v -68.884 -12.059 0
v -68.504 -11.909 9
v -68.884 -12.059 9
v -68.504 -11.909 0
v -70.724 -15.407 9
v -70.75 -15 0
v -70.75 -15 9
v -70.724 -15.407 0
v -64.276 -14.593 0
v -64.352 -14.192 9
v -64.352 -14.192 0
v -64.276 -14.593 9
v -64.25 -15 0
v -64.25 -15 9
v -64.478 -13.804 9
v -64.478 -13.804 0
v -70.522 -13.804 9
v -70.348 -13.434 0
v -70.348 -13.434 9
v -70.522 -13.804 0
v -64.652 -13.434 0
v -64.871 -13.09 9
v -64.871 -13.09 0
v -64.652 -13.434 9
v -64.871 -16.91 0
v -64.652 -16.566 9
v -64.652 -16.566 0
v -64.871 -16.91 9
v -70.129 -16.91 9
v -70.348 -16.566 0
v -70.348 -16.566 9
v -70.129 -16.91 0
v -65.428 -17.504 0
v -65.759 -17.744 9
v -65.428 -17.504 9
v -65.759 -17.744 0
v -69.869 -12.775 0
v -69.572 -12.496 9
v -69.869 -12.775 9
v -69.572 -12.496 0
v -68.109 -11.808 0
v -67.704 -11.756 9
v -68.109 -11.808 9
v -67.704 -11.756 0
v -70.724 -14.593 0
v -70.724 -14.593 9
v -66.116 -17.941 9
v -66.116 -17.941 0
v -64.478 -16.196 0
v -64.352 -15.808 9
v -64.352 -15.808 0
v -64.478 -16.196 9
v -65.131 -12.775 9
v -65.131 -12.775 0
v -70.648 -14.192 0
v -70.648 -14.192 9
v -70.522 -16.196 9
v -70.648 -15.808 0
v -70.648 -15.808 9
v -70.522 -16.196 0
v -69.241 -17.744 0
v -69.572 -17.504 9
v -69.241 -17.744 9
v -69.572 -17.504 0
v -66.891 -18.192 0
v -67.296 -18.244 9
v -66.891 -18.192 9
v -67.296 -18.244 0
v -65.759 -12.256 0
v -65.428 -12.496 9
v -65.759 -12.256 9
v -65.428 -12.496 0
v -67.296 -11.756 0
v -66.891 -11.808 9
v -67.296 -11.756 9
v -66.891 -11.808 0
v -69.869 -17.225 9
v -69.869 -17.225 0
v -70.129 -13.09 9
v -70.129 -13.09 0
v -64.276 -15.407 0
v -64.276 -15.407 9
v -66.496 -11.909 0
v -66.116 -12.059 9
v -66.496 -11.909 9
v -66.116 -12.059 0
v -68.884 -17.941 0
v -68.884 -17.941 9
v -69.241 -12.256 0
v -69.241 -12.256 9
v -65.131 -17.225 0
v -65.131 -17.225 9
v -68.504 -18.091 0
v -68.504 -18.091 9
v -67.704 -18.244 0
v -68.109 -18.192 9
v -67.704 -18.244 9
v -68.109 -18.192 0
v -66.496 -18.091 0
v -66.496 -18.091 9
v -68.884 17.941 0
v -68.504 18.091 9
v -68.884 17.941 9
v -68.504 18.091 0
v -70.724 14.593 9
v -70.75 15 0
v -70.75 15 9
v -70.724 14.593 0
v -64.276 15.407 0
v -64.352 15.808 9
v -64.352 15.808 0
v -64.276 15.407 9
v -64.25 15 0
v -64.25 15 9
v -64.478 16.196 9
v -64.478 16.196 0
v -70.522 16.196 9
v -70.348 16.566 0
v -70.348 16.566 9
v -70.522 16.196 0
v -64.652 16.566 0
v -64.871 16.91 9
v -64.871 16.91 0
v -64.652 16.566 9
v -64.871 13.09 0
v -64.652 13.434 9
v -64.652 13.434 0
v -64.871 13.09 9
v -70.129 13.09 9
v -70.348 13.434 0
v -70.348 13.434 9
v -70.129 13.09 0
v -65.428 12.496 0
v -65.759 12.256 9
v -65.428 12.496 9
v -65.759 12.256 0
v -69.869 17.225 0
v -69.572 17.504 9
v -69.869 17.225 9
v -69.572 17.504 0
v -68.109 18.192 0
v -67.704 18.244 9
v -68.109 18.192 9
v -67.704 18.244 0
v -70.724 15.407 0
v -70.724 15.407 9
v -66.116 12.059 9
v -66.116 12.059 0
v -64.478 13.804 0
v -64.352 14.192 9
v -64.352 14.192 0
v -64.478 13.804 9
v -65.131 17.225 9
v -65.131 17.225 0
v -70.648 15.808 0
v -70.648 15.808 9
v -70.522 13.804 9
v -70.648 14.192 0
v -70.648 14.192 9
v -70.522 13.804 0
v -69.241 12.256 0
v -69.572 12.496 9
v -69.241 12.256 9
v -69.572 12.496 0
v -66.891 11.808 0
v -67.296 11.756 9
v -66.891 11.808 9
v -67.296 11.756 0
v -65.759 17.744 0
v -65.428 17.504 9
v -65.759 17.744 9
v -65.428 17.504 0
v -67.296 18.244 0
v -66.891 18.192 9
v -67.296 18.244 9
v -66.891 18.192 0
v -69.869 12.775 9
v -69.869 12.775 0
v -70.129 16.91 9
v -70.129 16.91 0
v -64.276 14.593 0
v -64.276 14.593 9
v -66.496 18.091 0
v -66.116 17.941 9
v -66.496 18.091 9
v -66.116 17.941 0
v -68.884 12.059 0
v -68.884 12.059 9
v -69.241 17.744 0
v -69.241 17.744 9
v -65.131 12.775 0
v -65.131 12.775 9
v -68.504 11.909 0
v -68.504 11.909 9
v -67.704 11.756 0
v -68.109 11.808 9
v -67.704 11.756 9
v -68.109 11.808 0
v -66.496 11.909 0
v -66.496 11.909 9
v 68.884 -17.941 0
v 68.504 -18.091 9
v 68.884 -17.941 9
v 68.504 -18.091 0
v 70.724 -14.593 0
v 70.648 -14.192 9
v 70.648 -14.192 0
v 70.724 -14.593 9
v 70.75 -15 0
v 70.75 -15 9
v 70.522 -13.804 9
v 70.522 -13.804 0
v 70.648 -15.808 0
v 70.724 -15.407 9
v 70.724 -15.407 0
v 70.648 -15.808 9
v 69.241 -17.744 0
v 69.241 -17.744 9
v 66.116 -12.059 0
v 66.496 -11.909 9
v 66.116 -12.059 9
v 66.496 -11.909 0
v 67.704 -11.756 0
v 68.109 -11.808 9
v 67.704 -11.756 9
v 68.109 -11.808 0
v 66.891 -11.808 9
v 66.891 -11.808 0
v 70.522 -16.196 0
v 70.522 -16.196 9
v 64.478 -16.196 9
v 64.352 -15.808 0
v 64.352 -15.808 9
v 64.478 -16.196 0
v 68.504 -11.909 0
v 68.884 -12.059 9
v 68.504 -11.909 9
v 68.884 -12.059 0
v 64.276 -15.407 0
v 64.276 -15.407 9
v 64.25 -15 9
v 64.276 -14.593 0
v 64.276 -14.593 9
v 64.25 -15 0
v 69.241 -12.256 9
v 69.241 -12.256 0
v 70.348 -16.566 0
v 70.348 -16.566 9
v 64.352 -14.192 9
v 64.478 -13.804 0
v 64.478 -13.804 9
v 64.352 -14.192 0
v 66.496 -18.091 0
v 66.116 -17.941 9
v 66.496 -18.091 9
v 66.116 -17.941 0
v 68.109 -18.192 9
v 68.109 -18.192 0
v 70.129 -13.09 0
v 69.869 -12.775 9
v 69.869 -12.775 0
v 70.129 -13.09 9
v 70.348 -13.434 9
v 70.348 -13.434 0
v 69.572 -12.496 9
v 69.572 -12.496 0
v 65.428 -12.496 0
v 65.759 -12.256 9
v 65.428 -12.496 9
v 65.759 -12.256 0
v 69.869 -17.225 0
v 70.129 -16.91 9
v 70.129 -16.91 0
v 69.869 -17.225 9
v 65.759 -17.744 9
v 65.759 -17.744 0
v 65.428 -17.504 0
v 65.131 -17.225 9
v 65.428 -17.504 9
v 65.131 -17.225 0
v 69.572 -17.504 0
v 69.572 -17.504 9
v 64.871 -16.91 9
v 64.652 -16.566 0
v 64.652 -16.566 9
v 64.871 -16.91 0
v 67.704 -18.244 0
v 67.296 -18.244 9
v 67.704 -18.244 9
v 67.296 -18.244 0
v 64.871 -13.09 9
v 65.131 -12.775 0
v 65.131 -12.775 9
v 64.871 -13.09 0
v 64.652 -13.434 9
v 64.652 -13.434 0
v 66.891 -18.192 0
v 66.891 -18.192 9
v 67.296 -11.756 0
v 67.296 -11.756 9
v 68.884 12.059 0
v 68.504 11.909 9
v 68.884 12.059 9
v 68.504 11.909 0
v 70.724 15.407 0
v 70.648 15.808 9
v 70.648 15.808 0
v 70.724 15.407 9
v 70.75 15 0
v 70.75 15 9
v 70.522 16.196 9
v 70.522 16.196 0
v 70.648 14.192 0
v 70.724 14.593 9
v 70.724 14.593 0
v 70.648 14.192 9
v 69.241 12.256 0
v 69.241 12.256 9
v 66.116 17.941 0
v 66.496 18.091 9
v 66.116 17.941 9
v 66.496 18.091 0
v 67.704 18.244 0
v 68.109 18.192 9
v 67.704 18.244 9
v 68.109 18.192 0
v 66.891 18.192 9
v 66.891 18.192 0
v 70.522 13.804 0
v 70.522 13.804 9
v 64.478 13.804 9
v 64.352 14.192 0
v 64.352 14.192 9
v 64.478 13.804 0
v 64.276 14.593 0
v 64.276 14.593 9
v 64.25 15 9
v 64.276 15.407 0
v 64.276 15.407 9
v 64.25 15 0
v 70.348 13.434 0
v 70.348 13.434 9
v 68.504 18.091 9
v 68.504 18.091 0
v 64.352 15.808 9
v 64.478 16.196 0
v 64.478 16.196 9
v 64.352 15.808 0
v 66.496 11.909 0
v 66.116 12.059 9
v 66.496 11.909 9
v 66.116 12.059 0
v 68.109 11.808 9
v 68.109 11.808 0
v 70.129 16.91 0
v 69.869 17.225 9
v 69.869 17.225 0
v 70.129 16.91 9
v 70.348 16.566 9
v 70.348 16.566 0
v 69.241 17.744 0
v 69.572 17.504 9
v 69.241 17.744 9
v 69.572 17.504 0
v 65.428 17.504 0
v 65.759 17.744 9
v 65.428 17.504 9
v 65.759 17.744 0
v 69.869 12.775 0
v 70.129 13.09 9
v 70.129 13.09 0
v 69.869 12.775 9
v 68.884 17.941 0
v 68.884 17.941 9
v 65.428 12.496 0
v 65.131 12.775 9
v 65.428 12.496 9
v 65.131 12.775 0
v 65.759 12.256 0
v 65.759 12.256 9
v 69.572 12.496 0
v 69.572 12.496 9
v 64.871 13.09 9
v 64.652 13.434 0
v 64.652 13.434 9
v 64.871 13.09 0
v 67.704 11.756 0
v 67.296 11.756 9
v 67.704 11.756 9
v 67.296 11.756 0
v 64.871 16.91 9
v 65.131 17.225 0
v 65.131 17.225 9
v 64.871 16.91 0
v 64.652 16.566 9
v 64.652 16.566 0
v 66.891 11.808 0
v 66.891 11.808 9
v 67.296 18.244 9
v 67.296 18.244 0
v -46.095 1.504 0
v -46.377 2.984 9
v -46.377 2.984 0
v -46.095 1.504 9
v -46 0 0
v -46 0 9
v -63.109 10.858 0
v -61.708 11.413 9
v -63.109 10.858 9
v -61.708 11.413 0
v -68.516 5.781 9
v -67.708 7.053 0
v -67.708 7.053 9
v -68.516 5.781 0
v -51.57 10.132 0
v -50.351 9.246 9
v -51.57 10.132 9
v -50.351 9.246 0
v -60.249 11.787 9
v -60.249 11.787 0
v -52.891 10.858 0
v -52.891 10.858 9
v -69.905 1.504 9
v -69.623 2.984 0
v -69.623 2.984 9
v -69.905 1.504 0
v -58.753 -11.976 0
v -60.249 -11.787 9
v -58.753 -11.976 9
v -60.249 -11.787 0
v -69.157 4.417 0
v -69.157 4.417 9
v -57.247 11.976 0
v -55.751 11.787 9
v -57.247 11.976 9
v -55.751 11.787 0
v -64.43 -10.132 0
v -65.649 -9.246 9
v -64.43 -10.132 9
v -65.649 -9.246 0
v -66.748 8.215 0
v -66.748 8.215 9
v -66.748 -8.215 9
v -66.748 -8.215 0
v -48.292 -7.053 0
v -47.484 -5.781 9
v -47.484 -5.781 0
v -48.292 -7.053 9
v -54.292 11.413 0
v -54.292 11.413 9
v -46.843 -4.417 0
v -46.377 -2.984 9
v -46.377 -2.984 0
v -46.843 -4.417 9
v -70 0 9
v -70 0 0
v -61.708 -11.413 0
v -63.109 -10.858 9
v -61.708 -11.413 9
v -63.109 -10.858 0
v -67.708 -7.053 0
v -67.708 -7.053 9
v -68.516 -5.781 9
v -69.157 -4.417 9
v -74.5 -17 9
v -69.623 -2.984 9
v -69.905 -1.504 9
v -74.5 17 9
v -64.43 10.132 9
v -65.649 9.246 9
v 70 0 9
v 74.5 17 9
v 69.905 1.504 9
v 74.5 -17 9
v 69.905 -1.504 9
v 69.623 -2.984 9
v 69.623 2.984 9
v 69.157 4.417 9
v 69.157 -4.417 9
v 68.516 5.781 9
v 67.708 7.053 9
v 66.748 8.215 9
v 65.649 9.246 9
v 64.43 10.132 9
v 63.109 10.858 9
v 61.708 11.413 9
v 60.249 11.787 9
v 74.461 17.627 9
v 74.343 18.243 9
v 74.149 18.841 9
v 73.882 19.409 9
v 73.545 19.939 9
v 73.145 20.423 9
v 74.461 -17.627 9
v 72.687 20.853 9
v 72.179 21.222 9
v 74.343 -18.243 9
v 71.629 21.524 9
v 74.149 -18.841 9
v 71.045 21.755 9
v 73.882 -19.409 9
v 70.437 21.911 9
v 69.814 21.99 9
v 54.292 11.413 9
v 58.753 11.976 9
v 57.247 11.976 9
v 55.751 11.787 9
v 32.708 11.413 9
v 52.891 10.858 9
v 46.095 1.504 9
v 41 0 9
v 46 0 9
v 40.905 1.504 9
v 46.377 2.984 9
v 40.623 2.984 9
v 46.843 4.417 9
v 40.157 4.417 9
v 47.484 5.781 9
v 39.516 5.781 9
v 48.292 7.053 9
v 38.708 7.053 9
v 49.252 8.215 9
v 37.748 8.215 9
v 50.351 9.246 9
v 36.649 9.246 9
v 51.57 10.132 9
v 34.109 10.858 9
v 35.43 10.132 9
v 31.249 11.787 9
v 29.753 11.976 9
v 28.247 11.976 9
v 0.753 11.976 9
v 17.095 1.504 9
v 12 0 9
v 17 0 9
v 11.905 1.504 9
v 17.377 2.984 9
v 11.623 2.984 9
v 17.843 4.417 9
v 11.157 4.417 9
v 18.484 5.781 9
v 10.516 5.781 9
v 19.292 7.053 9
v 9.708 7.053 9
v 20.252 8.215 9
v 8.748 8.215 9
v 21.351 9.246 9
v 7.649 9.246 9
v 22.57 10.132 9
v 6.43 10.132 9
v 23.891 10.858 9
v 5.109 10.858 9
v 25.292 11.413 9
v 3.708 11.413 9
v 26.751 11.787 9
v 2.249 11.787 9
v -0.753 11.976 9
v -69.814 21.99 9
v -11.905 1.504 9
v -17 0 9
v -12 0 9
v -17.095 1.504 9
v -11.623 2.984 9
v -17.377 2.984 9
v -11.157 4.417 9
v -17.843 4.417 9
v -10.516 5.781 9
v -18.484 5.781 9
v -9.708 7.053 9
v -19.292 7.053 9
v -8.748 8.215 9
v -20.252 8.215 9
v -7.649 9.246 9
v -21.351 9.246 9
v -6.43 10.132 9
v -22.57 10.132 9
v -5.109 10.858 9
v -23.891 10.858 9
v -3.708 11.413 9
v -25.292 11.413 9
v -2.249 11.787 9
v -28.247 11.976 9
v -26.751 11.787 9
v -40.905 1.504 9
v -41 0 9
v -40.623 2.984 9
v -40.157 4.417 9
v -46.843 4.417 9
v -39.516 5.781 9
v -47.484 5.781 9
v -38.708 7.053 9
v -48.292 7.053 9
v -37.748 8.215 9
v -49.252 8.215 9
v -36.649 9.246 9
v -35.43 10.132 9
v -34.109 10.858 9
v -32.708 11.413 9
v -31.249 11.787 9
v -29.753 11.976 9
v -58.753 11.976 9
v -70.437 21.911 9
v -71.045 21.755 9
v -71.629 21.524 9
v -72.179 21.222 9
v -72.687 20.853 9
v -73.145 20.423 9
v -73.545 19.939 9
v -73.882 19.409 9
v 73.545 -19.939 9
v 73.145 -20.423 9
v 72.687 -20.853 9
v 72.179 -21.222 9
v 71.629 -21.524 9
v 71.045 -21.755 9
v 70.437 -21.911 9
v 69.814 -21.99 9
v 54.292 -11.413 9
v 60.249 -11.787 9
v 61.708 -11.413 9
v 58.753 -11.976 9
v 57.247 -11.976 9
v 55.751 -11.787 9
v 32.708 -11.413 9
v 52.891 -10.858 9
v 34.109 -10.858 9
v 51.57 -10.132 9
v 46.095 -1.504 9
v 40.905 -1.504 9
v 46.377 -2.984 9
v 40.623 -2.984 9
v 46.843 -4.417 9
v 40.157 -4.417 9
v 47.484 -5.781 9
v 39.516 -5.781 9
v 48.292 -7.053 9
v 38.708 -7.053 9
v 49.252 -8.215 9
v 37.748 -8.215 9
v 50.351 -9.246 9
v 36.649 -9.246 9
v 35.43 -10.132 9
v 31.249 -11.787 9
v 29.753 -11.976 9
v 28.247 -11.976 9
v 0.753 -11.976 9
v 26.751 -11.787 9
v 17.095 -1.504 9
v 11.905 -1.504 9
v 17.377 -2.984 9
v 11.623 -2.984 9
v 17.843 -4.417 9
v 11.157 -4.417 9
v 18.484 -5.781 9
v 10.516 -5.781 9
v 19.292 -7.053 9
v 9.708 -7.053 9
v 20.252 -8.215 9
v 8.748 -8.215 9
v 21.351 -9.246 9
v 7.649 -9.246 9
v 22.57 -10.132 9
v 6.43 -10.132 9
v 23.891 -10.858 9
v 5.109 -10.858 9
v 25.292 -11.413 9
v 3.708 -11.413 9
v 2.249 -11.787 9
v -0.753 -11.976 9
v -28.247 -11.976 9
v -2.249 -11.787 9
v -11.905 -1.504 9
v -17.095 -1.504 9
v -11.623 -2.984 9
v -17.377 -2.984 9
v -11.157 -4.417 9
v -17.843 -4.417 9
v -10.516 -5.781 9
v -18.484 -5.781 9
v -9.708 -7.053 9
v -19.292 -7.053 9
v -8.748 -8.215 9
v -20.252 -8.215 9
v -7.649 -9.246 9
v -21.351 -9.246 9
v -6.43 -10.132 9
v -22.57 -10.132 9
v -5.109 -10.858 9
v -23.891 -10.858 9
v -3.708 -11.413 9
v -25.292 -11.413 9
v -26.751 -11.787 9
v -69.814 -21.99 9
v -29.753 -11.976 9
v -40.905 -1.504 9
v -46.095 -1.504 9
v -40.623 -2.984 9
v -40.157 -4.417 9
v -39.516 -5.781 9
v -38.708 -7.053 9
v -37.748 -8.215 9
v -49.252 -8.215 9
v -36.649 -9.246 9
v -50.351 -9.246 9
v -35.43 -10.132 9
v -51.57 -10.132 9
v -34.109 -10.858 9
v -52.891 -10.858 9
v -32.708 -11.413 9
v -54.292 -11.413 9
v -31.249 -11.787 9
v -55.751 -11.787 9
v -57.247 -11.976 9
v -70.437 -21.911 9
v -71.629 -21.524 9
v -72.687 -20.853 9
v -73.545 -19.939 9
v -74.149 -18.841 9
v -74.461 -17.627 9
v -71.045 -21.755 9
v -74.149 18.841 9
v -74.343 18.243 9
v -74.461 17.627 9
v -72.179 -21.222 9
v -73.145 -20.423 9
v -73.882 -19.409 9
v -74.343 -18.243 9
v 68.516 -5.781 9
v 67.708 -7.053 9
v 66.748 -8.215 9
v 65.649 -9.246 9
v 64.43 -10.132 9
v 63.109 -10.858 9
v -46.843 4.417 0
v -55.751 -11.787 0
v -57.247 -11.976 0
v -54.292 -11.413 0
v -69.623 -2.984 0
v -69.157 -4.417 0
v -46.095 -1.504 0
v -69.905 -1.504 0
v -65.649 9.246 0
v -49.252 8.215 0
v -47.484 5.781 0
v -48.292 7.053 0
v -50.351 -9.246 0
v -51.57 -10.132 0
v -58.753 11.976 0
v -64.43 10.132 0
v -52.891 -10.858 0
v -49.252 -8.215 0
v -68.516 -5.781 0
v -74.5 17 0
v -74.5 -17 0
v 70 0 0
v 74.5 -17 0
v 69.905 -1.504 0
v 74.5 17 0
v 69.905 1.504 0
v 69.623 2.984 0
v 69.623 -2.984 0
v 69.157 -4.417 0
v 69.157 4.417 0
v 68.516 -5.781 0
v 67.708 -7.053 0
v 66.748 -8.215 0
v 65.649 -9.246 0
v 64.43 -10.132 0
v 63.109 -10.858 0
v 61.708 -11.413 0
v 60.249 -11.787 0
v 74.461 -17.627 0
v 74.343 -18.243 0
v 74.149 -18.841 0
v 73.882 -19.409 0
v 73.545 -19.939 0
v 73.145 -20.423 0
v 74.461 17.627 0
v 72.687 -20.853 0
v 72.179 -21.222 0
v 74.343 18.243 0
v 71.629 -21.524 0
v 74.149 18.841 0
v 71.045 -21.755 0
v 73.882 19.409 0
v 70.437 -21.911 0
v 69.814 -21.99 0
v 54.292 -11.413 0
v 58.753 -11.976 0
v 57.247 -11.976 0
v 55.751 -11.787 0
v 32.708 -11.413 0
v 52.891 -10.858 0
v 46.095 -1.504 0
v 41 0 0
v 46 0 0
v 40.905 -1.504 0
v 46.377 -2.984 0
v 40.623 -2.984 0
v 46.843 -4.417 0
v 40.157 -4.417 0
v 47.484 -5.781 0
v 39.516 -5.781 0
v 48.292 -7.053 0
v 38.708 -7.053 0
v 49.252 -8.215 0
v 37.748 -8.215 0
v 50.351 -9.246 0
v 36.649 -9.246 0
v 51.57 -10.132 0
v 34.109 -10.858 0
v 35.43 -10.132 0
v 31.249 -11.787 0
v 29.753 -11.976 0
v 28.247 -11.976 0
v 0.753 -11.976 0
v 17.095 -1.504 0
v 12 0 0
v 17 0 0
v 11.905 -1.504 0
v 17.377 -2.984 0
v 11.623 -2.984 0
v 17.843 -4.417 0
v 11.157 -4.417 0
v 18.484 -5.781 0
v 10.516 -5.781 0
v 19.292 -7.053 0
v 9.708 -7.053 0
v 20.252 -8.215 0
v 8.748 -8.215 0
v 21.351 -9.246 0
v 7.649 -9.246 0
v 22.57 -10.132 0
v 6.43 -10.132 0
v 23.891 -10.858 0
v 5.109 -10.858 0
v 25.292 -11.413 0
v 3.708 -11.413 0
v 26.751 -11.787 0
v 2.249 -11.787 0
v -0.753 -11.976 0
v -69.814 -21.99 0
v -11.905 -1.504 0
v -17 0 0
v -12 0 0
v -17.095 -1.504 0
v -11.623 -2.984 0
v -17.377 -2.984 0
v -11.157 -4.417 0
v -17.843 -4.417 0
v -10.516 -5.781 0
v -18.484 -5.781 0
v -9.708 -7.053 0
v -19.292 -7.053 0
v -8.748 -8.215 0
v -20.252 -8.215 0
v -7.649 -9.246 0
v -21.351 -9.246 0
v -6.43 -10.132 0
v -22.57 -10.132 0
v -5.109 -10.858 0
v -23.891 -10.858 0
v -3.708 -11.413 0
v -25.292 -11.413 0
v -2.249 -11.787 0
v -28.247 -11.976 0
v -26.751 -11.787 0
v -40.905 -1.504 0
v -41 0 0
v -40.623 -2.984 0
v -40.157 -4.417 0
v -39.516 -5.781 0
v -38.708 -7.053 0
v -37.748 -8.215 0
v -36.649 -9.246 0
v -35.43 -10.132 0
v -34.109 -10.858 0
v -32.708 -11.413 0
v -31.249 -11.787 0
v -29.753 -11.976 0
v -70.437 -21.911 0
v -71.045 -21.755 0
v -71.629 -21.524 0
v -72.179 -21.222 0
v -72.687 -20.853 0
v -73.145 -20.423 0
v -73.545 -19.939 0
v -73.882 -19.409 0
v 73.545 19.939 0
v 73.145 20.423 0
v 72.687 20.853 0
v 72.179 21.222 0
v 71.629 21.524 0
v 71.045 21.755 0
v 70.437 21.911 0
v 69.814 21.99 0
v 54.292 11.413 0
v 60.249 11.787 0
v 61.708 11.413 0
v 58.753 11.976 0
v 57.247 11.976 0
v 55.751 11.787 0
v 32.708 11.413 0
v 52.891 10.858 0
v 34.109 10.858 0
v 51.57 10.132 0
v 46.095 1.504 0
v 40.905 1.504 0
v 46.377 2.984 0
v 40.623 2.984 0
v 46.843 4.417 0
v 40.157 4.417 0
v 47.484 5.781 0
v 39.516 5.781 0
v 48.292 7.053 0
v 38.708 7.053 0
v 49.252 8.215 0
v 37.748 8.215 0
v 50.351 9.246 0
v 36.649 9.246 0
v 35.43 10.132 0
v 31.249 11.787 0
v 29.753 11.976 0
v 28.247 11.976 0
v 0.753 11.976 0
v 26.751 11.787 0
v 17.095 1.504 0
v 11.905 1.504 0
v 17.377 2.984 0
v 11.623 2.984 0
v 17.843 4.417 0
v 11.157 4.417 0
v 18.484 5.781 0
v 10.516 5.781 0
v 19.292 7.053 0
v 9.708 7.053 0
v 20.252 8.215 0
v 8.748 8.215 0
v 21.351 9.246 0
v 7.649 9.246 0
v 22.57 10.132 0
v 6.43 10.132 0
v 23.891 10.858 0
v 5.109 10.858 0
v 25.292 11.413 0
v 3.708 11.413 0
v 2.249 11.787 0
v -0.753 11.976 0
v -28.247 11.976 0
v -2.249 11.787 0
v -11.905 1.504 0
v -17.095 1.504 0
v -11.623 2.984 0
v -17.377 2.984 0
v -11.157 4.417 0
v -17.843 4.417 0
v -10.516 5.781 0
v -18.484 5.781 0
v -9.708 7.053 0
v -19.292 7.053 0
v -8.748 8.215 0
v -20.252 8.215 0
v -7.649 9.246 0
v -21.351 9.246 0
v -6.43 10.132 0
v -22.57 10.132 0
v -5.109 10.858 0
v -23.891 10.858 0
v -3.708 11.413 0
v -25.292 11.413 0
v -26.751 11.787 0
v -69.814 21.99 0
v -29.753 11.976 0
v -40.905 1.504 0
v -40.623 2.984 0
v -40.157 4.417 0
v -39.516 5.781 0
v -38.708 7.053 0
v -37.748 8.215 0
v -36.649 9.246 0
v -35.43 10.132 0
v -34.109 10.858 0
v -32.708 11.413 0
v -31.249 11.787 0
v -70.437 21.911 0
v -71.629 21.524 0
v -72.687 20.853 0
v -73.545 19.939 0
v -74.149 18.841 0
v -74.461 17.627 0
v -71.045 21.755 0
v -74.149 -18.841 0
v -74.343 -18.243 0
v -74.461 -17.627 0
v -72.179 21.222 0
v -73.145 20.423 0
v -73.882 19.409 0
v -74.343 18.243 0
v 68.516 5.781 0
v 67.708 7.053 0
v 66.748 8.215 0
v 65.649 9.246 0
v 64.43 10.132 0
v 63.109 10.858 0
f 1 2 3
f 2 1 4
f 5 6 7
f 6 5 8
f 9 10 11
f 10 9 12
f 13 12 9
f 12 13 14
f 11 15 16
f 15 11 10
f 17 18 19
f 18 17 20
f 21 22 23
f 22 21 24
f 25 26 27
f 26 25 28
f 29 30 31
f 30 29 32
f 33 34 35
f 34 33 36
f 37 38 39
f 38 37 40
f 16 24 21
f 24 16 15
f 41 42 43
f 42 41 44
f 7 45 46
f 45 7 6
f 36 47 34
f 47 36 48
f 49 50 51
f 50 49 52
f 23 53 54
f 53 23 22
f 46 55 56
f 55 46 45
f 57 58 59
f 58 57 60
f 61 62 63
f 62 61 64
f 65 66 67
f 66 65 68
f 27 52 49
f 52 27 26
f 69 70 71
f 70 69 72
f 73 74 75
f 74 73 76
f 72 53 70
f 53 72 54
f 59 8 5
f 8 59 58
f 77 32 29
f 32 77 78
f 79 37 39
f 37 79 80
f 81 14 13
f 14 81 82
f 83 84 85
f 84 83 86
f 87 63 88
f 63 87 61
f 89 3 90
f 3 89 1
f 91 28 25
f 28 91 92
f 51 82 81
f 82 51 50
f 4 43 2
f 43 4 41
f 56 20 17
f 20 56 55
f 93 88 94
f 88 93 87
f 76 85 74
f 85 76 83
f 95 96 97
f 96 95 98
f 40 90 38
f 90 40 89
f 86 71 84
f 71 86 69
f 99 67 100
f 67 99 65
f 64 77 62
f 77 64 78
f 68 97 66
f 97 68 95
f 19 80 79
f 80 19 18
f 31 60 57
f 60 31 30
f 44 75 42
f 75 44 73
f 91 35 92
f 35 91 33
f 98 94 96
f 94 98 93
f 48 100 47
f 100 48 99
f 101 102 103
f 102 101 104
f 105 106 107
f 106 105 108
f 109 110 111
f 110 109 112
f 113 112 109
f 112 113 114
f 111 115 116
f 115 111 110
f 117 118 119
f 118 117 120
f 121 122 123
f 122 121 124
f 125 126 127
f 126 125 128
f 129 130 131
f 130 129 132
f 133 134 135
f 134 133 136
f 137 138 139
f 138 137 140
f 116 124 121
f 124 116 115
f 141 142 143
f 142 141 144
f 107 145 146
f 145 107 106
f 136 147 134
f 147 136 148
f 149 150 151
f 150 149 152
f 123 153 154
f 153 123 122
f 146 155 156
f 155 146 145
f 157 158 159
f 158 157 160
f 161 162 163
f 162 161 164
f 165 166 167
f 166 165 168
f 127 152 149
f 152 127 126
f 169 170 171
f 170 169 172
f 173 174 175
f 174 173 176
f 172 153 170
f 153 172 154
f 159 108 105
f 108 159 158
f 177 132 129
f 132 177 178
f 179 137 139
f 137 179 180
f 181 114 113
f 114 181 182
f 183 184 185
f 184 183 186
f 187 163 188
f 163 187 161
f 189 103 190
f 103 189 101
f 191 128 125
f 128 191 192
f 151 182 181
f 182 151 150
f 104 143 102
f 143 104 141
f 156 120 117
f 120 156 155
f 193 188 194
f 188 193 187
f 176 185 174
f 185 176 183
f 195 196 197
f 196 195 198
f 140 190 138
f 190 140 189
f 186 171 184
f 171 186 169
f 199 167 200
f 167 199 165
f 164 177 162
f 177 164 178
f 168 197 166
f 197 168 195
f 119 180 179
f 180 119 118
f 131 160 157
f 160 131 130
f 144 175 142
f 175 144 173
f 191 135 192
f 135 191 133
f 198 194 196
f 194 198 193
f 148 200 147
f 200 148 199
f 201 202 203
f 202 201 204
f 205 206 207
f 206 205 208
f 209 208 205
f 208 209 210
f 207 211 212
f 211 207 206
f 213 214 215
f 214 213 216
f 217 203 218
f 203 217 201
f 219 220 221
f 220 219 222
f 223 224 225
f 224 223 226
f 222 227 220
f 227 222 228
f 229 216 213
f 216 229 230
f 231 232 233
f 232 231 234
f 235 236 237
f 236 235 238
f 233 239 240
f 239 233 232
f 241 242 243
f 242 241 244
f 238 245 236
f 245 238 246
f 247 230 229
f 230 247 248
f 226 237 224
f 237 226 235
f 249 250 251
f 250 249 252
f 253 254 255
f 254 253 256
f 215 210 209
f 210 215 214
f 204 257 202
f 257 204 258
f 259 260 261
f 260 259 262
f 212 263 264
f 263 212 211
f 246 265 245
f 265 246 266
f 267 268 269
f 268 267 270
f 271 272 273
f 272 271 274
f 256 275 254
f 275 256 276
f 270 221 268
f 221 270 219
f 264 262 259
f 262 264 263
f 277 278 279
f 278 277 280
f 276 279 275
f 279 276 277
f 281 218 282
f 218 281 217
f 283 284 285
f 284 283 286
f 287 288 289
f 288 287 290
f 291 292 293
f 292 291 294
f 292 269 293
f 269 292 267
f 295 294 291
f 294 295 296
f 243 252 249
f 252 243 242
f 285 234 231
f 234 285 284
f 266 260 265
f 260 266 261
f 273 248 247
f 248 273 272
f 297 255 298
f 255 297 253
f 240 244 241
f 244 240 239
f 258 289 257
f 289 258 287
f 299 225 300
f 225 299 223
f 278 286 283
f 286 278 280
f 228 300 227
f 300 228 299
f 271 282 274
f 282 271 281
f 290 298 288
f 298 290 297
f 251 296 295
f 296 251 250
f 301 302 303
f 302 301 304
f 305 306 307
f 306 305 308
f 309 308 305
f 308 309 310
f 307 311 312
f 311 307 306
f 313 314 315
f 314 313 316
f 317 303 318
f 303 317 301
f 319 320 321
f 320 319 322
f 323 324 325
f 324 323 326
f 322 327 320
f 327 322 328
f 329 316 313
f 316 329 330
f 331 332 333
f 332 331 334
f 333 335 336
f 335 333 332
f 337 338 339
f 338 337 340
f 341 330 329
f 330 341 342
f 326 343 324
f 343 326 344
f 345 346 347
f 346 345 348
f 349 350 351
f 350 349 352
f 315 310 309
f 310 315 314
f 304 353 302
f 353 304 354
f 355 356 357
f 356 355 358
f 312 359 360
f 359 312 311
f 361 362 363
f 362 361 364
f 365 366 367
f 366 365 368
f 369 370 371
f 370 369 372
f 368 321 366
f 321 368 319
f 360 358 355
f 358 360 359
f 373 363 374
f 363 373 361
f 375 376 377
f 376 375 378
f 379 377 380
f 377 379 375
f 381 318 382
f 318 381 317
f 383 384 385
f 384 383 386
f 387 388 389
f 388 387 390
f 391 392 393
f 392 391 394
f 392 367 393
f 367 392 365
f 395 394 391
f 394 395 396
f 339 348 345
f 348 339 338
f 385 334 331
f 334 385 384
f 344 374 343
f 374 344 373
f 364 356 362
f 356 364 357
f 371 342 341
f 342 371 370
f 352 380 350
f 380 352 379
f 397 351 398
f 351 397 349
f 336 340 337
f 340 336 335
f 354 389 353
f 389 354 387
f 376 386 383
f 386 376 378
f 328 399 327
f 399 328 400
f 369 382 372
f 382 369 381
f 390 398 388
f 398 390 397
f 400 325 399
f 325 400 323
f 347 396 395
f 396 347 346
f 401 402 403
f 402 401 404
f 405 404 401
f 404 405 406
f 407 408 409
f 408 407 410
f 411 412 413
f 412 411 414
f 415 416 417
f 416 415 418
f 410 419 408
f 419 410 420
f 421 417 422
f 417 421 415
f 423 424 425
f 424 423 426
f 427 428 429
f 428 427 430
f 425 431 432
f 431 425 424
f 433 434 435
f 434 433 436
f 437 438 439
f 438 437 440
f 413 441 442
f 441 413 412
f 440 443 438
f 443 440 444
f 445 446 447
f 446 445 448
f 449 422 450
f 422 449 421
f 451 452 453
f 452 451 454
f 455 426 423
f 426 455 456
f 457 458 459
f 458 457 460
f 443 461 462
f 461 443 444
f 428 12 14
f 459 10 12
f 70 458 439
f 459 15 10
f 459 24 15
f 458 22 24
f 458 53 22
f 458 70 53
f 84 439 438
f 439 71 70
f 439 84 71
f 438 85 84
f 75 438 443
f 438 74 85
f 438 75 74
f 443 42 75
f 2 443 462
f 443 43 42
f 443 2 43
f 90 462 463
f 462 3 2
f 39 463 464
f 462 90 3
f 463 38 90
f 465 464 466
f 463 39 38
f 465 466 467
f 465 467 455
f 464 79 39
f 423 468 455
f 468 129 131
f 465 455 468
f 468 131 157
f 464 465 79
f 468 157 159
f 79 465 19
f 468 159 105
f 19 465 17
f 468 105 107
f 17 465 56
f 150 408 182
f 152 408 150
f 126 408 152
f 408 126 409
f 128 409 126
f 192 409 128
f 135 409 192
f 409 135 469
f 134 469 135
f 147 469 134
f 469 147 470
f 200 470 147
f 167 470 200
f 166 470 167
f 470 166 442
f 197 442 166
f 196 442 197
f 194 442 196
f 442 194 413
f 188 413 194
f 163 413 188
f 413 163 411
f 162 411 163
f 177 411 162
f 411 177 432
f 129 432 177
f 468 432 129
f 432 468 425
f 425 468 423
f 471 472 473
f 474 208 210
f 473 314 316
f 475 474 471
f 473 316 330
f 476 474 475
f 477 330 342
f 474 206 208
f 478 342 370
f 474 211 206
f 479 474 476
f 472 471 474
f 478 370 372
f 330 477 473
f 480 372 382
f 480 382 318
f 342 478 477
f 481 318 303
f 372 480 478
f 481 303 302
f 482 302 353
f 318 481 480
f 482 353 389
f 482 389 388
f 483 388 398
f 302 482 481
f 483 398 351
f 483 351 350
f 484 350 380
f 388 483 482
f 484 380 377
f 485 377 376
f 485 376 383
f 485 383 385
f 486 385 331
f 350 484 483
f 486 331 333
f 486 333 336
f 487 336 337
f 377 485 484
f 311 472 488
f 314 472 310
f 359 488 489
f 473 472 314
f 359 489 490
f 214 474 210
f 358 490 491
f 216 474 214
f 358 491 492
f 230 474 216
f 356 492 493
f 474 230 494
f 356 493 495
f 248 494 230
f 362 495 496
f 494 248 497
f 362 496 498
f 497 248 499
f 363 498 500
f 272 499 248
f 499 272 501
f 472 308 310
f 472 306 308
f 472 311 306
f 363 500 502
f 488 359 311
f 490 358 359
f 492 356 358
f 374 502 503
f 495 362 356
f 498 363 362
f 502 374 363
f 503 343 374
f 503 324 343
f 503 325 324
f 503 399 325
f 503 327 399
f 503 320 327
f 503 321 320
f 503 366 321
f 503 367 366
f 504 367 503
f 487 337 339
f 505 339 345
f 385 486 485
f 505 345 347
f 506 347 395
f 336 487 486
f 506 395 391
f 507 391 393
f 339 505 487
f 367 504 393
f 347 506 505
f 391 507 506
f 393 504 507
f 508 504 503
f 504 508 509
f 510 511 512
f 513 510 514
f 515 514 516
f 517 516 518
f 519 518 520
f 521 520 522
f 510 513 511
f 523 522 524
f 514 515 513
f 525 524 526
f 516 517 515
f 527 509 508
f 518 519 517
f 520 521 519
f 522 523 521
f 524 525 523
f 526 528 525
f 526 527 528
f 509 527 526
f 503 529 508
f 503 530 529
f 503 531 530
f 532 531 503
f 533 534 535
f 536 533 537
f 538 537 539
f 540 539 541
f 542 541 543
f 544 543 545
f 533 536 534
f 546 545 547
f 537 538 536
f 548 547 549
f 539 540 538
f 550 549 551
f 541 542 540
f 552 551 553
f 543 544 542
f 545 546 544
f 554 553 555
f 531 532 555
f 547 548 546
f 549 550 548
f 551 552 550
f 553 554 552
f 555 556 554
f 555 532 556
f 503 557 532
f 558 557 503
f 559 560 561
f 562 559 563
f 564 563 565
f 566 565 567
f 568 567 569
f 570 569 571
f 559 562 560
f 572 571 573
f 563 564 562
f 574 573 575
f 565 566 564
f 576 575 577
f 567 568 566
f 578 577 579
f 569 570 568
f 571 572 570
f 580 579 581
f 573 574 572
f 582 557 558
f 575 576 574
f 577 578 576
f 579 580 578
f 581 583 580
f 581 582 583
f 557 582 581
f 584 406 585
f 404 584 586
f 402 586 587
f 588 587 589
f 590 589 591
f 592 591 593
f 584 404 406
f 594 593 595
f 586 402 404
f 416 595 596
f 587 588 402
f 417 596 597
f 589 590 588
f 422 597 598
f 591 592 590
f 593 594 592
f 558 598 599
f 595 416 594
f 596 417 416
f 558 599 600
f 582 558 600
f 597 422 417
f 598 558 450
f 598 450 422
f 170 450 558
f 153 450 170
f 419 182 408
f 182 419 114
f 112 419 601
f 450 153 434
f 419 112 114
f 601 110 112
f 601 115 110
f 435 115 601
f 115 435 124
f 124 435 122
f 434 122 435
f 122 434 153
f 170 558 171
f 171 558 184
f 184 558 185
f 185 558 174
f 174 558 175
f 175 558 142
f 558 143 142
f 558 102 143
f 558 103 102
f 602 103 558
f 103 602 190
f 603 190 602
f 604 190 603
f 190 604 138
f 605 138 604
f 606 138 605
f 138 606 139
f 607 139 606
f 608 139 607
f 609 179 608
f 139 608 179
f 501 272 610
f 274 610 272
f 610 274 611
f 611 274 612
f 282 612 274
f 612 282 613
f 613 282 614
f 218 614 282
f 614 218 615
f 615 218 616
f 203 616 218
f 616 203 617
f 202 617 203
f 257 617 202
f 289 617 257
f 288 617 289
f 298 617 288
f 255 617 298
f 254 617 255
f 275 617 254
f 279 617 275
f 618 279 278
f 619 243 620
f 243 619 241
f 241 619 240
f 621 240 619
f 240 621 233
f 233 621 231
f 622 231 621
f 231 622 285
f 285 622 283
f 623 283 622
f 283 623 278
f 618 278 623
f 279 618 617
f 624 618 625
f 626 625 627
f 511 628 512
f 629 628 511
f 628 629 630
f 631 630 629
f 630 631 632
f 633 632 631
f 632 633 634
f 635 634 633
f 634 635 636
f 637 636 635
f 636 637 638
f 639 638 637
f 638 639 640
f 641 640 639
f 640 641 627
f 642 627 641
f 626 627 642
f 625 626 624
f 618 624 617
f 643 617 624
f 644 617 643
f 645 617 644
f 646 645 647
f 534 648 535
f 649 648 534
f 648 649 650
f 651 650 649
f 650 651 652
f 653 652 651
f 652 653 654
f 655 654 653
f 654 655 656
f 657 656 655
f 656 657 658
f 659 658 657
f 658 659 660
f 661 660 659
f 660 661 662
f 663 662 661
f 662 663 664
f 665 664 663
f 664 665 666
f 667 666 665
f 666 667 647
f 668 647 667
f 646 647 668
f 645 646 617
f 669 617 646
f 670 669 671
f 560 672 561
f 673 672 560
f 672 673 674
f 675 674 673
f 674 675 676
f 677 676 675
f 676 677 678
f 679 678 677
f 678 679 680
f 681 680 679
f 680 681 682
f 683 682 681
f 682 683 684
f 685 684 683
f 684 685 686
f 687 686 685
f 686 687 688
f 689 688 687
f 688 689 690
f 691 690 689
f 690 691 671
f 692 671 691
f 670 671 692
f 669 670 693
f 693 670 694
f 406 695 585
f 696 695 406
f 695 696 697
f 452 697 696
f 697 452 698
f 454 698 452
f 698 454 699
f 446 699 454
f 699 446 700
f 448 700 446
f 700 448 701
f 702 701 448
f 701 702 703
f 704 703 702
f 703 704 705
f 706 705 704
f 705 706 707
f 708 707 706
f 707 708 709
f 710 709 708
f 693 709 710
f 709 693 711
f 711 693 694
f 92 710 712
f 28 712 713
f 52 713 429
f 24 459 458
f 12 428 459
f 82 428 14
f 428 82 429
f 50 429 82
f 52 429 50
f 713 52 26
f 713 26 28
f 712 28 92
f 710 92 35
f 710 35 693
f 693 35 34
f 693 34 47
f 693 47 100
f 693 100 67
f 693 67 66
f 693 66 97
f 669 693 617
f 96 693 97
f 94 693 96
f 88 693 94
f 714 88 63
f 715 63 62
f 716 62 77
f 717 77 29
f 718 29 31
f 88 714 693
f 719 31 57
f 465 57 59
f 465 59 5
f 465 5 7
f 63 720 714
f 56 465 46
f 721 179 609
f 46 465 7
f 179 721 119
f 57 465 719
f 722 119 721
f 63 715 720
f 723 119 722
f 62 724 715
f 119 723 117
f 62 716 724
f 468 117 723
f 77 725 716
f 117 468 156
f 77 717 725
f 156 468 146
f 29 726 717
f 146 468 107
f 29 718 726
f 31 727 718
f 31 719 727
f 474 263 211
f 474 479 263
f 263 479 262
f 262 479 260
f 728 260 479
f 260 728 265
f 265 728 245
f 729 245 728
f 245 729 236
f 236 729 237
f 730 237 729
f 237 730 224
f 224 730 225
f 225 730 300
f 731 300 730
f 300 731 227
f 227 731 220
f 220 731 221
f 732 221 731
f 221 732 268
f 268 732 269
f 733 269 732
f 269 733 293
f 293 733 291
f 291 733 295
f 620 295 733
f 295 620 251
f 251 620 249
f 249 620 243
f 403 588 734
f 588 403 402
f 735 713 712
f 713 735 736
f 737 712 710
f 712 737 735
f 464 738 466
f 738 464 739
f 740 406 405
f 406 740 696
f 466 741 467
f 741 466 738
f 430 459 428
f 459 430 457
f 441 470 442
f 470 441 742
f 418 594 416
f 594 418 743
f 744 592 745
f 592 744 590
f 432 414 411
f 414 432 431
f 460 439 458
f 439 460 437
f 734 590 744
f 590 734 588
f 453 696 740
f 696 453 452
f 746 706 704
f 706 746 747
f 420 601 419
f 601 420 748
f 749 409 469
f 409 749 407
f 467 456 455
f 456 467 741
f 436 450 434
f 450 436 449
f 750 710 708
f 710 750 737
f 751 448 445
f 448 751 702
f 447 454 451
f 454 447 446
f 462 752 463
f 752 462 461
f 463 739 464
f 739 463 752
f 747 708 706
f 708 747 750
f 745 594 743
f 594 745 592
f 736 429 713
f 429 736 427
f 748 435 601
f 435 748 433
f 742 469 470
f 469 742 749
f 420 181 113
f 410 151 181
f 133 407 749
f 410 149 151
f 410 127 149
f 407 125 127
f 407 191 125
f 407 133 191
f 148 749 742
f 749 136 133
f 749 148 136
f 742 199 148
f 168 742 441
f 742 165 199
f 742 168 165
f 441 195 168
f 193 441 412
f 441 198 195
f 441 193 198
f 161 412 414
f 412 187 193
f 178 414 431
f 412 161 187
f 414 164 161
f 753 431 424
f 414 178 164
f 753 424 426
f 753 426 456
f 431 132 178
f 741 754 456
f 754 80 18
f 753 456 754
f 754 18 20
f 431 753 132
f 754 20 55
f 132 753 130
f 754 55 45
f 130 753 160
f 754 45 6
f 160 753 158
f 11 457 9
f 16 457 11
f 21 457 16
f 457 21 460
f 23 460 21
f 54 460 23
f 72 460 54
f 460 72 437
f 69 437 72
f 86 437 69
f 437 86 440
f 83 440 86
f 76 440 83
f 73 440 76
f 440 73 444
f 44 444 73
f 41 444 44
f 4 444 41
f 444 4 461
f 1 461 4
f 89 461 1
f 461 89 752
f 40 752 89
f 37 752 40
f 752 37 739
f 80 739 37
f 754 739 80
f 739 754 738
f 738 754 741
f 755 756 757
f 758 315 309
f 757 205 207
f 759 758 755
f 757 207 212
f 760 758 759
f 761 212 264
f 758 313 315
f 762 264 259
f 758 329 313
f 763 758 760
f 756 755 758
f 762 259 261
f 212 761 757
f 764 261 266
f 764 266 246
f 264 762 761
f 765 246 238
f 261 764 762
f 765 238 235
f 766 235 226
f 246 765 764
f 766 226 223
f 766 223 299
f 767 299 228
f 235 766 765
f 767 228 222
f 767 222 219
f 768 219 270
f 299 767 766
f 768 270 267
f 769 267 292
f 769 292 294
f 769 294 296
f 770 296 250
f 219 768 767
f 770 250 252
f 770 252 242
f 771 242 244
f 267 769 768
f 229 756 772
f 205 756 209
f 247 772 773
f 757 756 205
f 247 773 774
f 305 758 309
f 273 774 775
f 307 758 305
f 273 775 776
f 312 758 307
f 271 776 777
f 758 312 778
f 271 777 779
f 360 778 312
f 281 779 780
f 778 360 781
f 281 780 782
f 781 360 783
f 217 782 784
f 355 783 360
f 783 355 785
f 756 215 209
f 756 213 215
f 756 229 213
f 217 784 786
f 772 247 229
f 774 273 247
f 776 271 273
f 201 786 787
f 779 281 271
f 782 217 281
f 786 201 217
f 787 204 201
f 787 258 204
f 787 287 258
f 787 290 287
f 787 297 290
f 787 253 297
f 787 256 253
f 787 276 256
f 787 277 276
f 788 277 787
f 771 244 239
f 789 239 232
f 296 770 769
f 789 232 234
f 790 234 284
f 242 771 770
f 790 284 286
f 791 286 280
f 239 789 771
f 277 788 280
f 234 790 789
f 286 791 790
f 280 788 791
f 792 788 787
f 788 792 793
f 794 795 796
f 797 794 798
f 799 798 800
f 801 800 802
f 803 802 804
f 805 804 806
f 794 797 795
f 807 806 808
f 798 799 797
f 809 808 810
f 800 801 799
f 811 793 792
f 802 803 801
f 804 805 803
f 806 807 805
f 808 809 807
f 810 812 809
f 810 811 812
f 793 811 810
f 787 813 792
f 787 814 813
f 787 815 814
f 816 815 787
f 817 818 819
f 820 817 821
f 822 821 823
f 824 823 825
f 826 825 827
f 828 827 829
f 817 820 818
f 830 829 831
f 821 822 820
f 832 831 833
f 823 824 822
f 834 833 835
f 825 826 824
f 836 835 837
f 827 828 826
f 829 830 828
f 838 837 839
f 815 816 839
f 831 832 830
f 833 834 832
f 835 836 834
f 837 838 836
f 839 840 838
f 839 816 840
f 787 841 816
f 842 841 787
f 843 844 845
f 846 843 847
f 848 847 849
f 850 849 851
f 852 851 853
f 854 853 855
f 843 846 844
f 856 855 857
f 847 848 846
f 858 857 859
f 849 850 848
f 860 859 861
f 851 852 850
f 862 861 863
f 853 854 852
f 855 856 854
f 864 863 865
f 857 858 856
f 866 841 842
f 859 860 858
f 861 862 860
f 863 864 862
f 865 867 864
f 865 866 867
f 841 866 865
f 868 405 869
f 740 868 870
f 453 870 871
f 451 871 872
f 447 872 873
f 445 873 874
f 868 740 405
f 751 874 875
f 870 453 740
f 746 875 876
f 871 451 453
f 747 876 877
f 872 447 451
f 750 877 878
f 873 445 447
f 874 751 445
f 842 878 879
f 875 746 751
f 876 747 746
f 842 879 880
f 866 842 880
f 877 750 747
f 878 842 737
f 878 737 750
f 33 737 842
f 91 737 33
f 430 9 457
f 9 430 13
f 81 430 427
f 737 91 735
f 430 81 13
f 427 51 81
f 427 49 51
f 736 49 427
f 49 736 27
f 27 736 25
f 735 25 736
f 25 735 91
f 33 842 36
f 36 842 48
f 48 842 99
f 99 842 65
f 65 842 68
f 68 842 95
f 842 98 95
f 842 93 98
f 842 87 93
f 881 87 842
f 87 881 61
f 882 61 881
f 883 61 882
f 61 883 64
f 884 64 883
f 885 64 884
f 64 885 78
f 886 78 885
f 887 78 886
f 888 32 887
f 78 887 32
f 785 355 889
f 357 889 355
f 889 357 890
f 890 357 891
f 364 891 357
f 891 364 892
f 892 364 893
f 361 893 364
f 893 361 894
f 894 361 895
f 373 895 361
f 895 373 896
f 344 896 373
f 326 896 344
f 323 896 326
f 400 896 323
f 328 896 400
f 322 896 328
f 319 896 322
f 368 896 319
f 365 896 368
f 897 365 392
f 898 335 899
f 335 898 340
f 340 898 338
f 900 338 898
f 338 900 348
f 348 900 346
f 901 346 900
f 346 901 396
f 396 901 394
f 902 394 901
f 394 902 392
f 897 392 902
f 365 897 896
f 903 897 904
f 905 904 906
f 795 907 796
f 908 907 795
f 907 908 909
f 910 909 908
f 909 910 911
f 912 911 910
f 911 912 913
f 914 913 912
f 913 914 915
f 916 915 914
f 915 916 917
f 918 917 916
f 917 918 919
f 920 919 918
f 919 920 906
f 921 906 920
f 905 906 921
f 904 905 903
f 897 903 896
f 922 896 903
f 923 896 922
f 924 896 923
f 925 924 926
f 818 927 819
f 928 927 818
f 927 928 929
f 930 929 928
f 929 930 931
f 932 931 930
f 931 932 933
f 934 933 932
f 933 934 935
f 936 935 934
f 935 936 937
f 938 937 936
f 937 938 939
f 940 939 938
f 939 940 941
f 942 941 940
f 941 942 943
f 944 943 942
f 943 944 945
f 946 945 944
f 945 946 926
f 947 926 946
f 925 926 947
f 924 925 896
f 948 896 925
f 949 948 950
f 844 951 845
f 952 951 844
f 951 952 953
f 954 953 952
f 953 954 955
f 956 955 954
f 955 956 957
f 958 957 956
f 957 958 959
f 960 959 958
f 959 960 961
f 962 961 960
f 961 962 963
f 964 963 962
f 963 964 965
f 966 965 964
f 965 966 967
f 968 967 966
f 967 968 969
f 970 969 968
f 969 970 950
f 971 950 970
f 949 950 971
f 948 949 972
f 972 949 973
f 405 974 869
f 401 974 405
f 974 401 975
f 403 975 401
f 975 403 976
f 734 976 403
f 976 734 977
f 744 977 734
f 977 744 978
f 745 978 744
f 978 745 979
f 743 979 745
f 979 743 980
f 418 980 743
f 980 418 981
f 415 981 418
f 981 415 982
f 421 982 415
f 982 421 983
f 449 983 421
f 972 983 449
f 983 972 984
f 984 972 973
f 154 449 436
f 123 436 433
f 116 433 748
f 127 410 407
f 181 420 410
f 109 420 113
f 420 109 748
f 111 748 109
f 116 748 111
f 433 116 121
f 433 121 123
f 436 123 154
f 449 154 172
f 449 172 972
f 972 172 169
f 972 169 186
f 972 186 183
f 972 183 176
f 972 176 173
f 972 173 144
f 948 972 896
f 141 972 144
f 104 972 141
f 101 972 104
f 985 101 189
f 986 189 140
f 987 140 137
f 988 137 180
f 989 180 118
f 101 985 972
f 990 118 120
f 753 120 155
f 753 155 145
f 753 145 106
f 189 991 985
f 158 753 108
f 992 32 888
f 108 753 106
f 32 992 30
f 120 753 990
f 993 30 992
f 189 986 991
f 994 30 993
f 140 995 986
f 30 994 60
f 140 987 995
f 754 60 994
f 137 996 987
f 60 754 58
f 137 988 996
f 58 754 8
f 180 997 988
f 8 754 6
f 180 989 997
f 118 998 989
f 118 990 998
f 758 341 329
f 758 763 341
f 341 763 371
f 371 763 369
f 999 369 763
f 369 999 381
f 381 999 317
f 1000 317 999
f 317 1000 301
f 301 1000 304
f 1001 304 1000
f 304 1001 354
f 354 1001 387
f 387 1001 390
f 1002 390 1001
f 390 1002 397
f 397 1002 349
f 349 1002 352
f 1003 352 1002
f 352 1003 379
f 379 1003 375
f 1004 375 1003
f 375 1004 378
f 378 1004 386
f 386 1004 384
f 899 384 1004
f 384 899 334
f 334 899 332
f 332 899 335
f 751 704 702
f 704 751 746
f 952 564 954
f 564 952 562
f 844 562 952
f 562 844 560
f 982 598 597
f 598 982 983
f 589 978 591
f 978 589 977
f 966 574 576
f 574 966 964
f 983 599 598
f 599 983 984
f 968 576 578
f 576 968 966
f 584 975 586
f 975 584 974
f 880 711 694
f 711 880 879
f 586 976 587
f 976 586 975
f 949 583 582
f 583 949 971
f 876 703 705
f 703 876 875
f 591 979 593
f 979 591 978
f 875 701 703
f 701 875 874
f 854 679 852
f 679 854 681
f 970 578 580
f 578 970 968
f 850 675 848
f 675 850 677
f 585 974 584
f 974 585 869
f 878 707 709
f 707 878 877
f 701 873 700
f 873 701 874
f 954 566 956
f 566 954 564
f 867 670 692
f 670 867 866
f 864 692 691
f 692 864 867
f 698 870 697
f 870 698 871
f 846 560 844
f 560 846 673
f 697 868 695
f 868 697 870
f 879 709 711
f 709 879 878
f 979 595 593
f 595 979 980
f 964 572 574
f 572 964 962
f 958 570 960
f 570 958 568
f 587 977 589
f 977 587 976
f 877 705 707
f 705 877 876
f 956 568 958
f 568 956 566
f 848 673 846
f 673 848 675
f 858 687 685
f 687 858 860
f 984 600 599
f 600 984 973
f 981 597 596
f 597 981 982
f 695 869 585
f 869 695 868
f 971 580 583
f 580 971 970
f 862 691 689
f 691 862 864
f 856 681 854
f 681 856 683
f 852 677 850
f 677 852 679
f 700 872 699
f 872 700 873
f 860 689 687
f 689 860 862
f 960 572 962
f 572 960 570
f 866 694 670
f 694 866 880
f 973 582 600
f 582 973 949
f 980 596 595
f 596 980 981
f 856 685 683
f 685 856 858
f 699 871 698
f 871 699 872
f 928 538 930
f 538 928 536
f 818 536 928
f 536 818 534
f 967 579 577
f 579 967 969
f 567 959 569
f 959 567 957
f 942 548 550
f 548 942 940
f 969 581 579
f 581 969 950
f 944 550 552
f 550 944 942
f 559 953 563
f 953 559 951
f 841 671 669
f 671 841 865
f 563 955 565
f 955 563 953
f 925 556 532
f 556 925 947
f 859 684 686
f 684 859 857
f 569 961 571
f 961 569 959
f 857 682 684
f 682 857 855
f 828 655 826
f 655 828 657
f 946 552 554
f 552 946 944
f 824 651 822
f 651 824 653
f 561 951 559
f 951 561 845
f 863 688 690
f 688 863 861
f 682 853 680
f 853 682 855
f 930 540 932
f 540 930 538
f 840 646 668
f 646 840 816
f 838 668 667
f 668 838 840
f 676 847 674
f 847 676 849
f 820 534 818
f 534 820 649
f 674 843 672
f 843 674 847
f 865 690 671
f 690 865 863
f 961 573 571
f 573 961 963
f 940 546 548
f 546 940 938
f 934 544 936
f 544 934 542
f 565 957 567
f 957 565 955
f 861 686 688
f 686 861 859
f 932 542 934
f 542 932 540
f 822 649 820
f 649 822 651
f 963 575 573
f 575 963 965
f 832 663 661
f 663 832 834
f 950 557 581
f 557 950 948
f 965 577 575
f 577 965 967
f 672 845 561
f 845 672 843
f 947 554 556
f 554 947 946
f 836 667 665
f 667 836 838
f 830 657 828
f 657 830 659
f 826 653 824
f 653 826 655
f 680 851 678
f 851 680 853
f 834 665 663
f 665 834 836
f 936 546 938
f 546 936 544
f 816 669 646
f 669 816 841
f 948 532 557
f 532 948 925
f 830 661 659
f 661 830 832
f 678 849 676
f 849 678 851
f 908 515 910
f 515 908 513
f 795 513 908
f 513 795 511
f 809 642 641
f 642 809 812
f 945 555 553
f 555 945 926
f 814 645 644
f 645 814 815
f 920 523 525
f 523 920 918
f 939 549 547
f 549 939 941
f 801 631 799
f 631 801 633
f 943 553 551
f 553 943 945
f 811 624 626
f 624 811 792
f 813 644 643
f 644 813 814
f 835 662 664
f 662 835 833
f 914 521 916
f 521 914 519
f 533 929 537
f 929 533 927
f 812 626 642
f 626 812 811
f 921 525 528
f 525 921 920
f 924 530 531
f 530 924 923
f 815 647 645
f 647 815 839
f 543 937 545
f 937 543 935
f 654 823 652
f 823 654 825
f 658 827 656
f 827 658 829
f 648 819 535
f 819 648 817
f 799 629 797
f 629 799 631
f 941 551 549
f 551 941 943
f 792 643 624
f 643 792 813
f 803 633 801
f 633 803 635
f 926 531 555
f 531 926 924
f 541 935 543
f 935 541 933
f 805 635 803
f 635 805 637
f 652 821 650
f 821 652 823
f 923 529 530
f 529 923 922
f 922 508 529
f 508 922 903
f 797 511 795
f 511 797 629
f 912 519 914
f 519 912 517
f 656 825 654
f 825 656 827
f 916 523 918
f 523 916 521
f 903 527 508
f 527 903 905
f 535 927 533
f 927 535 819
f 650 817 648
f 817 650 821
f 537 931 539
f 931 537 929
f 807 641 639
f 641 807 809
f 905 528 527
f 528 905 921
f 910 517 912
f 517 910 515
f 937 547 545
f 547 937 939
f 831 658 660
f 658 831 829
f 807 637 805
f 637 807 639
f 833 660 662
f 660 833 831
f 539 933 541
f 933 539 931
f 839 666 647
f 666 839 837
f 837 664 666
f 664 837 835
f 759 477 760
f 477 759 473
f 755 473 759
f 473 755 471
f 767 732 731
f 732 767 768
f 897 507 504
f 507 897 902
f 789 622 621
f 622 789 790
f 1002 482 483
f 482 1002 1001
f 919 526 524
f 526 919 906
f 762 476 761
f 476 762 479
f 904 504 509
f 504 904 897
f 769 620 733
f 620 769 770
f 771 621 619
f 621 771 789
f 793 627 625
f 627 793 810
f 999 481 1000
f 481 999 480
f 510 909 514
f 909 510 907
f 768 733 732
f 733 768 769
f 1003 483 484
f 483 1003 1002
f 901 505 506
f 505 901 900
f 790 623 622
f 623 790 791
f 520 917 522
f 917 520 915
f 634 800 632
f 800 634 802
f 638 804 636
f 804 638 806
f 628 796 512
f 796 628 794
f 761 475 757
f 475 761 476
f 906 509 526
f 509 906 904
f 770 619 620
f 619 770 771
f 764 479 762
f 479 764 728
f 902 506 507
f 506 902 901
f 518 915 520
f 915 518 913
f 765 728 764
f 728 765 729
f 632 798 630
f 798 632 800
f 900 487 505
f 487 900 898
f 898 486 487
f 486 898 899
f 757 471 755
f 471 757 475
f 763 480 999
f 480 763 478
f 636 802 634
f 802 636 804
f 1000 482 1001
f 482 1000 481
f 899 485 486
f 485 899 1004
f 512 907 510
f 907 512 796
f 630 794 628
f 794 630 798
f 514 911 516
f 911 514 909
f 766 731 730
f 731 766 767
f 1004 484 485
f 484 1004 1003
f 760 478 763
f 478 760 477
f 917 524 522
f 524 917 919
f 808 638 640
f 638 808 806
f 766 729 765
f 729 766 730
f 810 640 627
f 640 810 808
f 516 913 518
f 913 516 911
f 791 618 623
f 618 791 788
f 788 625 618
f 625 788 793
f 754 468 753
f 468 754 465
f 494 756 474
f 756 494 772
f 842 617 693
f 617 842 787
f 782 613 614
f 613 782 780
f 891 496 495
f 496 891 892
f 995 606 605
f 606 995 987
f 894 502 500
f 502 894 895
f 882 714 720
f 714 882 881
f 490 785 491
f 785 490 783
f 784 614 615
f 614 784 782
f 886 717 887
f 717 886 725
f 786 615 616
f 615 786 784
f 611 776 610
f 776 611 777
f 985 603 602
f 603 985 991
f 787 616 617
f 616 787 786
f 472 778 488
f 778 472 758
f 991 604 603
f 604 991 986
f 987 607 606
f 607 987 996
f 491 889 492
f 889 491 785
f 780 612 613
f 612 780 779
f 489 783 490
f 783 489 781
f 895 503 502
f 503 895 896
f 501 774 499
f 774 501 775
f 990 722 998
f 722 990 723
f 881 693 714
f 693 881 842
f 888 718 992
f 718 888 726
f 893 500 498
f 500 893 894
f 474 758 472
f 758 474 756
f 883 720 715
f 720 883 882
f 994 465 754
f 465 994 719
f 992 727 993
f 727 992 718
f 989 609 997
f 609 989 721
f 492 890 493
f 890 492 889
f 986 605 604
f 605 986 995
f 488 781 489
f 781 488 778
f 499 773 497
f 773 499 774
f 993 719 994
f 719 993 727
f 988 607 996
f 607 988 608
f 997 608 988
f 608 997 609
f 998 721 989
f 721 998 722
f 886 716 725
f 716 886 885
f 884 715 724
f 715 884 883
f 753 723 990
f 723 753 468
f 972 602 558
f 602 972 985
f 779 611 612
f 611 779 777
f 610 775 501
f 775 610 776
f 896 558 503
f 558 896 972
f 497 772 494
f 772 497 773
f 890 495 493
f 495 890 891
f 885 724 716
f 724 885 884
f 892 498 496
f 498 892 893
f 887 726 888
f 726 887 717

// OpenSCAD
$fn = 50;

difference() {
	union() {
		hull() {
			translate(v = [-69.5, 17.0, 0]) {
				cylinder(h = 9, r = 5);
			}
			translate(v = [69.5, 17.0, 0]) {
				cylinder(h = 9, r = 5);
			}
			translate(v = [-69.5, -17.0, 0]) {
				cylinder(h = 9, r = 5);
			}
			translate(v = [69.5, -17.0, 0]) {
				cylinder(h = 9, r = 5);
			}
		}
	}
	union() {
		translate(v = [-67.5, -15.0, -100.0]) {
			cylinder(h = 200, r = 3.25);
		}
		translate(v = [-67.5, 15.0, -100.0]) {
			cylinder(h = 200, r = 3.25);
		}
		translate(v = [67.5, -15.0, -100.0]) {
			cylinder(h = 200, r = 3.25);
		}
		translate(v = [67.5, 15.0, -100.0]) {
			cylinder(h = 200, r = 3.25);
		}
		translate(v = [-67.5, -15.0, -100.0]) {
			cylinder(h = 200, r = 1.8);
		}
		translate(v = [-67.5, 15.0, -100.0]) {
			cylinder(h = 200, r = 1.8);
		}
		translate(v = [67.5, -15.0, -100.0]) {
			cylinder(h = 200, r = 1.8);
		}
		translate(v = [67.5, 15.0, -100.0]) {
			cylinder(h = 200, r = 1.8);
		}
		translate(v = [-58.0, 0, 0.0]) {
			cylinder(h = 9, r = 12.0);
		}
		translate(v = [-29.0, 0, 0.0]) {
			cylinder(h = 9, r = 12.0);
		}
		cylinder(h = 9, r = 12.0);
		translate(v = [29.0, 0, 0.0]) {
			cylinder(h = 9, r = 12.0);
		}
		translate(v = [58.0, 0, 0.0]) {
			cylinder(h = 9, r = 12.0);
		}
	}
}
